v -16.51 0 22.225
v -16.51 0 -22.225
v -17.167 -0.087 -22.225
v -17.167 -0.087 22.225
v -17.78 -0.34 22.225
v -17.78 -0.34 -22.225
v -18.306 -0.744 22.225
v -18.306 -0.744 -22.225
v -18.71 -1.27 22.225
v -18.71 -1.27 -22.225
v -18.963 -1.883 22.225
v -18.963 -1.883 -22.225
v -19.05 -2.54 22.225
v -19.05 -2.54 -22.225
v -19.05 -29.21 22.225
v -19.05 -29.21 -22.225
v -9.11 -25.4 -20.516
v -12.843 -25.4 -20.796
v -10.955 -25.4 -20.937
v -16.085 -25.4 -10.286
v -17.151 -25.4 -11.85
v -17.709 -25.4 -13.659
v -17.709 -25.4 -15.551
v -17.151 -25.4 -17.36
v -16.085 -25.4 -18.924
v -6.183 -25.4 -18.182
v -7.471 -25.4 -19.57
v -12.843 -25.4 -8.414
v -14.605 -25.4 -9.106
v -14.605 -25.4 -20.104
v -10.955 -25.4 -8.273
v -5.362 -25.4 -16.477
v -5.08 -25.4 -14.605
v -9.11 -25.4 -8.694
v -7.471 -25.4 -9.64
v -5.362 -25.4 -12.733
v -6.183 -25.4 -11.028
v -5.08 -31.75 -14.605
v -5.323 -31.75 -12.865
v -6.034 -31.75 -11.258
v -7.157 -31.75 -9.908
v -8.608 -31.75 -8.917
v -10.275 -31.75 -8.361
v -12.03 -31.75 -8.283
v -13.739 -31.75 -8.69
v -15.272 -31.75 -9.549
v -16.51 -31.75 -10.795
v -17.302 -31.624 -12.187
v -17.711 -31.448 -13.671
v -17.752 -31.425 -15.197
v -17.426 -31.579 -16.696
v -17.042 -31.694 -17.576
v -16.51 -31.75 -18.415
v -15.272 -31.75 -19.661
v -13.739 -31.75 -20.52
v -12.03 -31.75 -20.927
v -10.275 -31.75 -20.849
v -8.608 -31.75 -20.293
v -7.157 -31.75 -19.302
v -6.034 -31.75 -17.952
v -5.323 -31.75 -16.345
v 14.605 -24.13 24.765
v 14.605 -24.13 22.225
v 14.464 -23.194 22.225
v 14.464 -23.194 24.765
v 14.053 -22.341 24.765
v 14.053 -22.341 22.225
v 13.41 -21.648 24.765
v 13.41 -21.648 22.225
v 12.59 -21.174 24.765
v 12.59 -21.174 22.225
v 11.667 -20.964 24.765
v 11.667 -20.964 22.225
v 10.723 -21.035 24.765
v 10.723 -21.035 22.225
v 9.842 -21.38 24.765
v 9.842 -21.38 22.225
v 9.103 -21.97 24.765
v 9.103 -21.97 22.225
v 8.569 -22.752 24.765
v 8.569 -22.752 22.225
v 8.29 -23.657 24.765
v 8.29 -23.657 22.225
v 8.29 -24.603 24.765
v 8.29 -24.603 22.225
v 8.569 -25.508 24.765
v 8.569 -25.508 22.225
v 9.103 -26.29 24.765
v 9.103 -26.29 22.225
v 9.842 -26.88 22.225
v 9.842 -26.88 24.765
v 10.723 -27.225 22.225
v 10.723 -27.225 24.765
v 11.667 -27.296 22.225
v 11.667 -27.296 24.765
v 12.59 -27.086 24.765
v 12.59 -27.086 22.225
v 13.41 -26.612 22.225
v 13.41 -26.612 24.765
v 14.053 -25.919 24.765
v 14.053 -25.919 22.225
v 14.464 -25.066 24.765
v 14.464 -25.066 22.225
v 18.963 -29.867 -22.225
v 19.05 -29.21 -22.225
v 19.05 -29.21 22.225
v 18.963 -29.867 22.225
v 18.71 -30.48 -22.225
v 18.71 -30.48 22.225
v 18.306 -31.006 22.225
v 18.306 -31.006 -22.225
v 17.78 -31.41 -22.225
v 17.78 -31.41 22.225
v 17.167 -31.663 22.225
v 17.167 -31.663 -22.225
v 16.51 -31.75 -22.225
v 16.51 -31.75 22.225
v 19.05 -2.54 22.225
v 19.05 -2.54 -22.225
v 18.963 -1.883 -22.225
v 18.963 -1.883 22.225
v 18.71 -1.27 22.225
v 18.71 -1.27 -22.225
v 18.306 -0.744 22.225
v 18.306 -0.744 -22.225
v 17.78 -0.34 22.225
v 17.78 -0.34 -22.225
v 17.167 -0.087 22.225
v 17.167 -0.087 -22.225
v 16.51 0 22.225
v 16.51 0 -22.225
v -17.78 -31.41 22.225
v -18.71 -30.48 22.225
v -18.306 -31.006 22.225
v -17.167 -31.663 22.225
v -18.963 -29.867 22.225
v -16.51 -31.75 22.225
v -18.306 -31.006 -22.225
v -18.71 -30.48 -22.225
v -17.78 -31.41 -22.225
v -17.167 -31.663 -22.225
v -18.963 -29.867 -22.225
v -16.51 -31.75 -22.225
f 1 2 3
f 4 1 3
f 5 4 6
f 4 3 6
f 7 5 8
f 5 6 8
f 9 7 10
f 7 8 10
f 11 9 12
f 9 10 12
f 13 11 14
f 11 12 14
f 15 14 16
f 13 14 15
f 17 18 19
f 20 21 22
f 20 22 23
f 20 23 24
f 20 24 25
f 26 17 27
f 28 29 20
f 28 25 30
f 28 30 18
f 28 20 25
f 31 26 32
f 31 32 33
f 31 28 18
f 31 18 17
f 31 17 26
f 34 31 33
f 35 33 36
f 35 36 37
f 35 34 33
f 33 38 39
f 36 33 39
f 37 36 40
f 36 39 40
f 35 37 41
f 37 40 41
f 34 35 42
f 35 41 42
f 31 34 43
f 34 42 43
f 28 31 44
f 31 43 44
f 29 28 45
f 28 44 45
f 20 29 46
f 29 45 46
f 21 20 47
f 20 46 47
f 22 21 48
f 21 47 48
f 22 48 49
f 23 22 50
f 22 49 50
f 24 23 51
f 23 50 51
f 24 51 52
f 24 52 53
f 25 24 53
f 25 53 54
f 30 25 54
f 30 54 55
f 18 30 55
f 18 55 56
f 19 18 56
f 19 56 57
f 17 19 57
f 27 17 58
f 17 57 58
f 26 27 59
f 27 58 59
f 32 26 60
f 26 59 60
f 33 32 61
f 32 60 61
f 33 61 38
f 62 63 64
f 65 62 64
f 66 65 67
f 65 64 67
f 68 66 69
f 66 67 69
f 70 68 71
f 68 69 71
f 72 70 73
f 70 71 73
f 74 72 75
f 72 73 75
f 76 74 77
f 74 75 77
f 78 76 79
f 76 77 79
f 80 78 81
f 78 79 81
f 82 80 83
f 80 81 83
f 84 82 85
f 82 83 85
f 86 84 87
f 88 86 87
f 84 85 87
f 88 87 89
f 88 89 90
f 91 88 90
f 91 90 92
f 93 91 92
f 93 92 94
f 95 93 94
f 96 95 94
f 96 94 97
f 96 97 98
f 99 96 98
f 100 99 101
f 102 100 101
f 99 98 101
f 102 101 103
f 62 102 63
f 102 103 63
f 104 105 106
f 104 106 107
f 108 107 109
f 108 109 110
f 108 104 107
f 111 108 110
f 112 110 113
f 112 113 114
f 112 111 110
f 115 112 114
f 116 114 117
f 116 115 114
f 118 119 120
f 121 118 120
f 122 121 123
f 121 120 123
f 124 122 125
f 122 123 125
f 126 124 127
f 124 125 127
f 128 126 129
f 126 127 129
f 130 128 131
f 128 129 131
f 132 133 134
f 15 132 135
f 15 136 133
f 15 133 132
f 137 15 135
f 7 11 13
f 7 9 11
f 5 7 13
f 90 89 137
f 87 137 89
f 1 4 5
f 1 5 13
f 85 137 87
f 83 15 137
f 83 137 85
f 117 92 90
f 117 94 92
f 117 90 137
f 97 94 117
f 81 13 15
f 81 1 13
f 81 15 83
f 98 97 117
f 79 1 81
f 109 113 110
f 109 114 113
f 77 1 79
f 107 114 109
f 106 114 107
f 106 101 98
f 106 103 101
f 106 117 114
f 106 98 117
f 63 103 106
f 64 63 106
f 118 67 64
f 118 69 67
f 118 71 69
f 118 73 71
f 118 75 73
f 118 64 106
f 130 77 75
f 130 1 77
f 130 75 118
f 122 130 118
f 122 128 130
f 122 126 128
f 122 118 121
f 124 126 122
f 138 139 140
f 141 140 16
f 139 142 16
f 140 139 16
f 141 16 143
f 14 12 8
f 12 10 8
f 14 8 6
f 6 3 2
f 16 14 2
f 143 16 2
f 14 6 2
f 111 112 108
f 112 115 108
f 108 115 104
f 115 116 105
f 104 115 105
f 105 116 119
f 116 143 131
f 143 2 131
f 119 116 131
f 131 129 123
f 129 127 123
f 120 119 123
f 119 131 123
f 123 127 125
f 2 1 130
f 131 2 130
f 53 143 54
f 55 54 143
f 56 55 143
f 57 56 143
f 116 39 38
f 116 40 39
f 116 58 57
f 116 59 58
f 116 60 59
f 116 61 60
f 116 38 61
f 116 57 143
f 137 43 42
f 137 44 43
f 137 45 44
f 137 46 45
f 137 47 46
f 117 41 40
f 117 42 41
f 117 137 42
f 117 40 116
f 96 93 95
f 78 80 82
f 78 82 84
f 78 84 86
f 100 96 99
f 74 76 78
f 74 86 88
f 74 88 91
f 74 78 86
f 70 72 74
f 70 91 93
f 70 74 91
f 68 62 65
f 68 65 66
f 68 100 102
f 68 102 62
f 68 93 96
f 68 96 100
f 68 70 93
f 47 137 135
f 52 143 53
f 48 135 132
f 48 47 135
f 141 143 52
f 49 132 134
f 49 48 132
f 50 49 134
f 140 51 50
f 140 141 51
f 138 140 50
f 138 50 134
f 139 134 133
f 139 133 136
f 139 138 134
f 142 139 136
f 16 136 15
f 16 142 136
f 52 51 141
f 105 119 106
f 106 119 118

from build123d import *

# Parameters (mm, degrees)
F0_W        = 38.1
F0_H        = 44.45
F1_DEPTH    = 31.75
F2_R        = 6.35
F3_DEPTH    = 6.35
F4_R        = 3.175
F5_DEPTH    = 2.54
F6_T1_DEPTH = 57.15


# Not quite as in the source:
# - a fillet or chamfer that OpenCascade refuses, or shapes differently, is made with other operations: its cross-section is extruded or revolved along the edge and cut away or added


with BuildPart() as f1:
    # F0 (on Front) → F1 (new body)
    with BuildSketch(Plane.XZ):
        Rectangle(F0_W, F0_H)
    extrude(amount=F1_DEPTH)

    # F2 (on face) → F3 (cut)
    with BuildSketch(Plane.XZ.offset(31.75)):
        with Locations((-11.43, -14.605)):
            Circle(F2_R)
    extrude(amount=-F3_DEPTH, mode=Mode.SUBTRACT)

    # F4 (on face) → F5 (join)
    with BuildSketch(Plane.XY.offset(22.225)):
        with Locations((11.43, -24.13)):
            Circle(F4_R)
    extrude(amount=F5_DEPTH)

    # F6: fillet of radius 2.54 on 4 edges, made by hand

    # F6_s2 → F6_t1 (cut)
    with BuildSketch(Plane.XY.offset(-28.575)):
        with BuildLine():
            ThreePointArc((-16.51, -31.75), (-18.3060512242, -31.0060512242), (-19.05, -29.21))
            Line((-19.05, -29.21), (-19.05, -31.75))
            Line((-19.05, -31.75), (-16.51, -31.75))
        make_face()
        with BuildLine():
            ThreePointArc((19.05, -29.21), (18.3060512242, -31.0060512242), (16.51, -31.75))
            Line((16.51, -31.75), (19.05, -31.75))
            Line((19.05, -31.75), (19.05, -29.21))
        make_face()
        with BuildLine():
            ThreePointArc((-16.51, 0), (-18.3060512242, -0.7439487758), (-19.05, -2.54))
            Line((-19.05, -2.54), (-19.05, 0))
            Line((-19.05, 0), (-16.51, 0))
        make_face()
        with BuildLine():
            ThreePointArc((19.05, -2.54), (18.3060512242, -0.7439487758), (16.51, 0))
            Line((16.51, 0), (19.05, 0))
            Line((19.05, 0), (19.05, -2.54))
        make_face()
    extrude(amount=F6_T1_DEPTH, mode=Mode.SUBTRACT)


solid = f1.part
